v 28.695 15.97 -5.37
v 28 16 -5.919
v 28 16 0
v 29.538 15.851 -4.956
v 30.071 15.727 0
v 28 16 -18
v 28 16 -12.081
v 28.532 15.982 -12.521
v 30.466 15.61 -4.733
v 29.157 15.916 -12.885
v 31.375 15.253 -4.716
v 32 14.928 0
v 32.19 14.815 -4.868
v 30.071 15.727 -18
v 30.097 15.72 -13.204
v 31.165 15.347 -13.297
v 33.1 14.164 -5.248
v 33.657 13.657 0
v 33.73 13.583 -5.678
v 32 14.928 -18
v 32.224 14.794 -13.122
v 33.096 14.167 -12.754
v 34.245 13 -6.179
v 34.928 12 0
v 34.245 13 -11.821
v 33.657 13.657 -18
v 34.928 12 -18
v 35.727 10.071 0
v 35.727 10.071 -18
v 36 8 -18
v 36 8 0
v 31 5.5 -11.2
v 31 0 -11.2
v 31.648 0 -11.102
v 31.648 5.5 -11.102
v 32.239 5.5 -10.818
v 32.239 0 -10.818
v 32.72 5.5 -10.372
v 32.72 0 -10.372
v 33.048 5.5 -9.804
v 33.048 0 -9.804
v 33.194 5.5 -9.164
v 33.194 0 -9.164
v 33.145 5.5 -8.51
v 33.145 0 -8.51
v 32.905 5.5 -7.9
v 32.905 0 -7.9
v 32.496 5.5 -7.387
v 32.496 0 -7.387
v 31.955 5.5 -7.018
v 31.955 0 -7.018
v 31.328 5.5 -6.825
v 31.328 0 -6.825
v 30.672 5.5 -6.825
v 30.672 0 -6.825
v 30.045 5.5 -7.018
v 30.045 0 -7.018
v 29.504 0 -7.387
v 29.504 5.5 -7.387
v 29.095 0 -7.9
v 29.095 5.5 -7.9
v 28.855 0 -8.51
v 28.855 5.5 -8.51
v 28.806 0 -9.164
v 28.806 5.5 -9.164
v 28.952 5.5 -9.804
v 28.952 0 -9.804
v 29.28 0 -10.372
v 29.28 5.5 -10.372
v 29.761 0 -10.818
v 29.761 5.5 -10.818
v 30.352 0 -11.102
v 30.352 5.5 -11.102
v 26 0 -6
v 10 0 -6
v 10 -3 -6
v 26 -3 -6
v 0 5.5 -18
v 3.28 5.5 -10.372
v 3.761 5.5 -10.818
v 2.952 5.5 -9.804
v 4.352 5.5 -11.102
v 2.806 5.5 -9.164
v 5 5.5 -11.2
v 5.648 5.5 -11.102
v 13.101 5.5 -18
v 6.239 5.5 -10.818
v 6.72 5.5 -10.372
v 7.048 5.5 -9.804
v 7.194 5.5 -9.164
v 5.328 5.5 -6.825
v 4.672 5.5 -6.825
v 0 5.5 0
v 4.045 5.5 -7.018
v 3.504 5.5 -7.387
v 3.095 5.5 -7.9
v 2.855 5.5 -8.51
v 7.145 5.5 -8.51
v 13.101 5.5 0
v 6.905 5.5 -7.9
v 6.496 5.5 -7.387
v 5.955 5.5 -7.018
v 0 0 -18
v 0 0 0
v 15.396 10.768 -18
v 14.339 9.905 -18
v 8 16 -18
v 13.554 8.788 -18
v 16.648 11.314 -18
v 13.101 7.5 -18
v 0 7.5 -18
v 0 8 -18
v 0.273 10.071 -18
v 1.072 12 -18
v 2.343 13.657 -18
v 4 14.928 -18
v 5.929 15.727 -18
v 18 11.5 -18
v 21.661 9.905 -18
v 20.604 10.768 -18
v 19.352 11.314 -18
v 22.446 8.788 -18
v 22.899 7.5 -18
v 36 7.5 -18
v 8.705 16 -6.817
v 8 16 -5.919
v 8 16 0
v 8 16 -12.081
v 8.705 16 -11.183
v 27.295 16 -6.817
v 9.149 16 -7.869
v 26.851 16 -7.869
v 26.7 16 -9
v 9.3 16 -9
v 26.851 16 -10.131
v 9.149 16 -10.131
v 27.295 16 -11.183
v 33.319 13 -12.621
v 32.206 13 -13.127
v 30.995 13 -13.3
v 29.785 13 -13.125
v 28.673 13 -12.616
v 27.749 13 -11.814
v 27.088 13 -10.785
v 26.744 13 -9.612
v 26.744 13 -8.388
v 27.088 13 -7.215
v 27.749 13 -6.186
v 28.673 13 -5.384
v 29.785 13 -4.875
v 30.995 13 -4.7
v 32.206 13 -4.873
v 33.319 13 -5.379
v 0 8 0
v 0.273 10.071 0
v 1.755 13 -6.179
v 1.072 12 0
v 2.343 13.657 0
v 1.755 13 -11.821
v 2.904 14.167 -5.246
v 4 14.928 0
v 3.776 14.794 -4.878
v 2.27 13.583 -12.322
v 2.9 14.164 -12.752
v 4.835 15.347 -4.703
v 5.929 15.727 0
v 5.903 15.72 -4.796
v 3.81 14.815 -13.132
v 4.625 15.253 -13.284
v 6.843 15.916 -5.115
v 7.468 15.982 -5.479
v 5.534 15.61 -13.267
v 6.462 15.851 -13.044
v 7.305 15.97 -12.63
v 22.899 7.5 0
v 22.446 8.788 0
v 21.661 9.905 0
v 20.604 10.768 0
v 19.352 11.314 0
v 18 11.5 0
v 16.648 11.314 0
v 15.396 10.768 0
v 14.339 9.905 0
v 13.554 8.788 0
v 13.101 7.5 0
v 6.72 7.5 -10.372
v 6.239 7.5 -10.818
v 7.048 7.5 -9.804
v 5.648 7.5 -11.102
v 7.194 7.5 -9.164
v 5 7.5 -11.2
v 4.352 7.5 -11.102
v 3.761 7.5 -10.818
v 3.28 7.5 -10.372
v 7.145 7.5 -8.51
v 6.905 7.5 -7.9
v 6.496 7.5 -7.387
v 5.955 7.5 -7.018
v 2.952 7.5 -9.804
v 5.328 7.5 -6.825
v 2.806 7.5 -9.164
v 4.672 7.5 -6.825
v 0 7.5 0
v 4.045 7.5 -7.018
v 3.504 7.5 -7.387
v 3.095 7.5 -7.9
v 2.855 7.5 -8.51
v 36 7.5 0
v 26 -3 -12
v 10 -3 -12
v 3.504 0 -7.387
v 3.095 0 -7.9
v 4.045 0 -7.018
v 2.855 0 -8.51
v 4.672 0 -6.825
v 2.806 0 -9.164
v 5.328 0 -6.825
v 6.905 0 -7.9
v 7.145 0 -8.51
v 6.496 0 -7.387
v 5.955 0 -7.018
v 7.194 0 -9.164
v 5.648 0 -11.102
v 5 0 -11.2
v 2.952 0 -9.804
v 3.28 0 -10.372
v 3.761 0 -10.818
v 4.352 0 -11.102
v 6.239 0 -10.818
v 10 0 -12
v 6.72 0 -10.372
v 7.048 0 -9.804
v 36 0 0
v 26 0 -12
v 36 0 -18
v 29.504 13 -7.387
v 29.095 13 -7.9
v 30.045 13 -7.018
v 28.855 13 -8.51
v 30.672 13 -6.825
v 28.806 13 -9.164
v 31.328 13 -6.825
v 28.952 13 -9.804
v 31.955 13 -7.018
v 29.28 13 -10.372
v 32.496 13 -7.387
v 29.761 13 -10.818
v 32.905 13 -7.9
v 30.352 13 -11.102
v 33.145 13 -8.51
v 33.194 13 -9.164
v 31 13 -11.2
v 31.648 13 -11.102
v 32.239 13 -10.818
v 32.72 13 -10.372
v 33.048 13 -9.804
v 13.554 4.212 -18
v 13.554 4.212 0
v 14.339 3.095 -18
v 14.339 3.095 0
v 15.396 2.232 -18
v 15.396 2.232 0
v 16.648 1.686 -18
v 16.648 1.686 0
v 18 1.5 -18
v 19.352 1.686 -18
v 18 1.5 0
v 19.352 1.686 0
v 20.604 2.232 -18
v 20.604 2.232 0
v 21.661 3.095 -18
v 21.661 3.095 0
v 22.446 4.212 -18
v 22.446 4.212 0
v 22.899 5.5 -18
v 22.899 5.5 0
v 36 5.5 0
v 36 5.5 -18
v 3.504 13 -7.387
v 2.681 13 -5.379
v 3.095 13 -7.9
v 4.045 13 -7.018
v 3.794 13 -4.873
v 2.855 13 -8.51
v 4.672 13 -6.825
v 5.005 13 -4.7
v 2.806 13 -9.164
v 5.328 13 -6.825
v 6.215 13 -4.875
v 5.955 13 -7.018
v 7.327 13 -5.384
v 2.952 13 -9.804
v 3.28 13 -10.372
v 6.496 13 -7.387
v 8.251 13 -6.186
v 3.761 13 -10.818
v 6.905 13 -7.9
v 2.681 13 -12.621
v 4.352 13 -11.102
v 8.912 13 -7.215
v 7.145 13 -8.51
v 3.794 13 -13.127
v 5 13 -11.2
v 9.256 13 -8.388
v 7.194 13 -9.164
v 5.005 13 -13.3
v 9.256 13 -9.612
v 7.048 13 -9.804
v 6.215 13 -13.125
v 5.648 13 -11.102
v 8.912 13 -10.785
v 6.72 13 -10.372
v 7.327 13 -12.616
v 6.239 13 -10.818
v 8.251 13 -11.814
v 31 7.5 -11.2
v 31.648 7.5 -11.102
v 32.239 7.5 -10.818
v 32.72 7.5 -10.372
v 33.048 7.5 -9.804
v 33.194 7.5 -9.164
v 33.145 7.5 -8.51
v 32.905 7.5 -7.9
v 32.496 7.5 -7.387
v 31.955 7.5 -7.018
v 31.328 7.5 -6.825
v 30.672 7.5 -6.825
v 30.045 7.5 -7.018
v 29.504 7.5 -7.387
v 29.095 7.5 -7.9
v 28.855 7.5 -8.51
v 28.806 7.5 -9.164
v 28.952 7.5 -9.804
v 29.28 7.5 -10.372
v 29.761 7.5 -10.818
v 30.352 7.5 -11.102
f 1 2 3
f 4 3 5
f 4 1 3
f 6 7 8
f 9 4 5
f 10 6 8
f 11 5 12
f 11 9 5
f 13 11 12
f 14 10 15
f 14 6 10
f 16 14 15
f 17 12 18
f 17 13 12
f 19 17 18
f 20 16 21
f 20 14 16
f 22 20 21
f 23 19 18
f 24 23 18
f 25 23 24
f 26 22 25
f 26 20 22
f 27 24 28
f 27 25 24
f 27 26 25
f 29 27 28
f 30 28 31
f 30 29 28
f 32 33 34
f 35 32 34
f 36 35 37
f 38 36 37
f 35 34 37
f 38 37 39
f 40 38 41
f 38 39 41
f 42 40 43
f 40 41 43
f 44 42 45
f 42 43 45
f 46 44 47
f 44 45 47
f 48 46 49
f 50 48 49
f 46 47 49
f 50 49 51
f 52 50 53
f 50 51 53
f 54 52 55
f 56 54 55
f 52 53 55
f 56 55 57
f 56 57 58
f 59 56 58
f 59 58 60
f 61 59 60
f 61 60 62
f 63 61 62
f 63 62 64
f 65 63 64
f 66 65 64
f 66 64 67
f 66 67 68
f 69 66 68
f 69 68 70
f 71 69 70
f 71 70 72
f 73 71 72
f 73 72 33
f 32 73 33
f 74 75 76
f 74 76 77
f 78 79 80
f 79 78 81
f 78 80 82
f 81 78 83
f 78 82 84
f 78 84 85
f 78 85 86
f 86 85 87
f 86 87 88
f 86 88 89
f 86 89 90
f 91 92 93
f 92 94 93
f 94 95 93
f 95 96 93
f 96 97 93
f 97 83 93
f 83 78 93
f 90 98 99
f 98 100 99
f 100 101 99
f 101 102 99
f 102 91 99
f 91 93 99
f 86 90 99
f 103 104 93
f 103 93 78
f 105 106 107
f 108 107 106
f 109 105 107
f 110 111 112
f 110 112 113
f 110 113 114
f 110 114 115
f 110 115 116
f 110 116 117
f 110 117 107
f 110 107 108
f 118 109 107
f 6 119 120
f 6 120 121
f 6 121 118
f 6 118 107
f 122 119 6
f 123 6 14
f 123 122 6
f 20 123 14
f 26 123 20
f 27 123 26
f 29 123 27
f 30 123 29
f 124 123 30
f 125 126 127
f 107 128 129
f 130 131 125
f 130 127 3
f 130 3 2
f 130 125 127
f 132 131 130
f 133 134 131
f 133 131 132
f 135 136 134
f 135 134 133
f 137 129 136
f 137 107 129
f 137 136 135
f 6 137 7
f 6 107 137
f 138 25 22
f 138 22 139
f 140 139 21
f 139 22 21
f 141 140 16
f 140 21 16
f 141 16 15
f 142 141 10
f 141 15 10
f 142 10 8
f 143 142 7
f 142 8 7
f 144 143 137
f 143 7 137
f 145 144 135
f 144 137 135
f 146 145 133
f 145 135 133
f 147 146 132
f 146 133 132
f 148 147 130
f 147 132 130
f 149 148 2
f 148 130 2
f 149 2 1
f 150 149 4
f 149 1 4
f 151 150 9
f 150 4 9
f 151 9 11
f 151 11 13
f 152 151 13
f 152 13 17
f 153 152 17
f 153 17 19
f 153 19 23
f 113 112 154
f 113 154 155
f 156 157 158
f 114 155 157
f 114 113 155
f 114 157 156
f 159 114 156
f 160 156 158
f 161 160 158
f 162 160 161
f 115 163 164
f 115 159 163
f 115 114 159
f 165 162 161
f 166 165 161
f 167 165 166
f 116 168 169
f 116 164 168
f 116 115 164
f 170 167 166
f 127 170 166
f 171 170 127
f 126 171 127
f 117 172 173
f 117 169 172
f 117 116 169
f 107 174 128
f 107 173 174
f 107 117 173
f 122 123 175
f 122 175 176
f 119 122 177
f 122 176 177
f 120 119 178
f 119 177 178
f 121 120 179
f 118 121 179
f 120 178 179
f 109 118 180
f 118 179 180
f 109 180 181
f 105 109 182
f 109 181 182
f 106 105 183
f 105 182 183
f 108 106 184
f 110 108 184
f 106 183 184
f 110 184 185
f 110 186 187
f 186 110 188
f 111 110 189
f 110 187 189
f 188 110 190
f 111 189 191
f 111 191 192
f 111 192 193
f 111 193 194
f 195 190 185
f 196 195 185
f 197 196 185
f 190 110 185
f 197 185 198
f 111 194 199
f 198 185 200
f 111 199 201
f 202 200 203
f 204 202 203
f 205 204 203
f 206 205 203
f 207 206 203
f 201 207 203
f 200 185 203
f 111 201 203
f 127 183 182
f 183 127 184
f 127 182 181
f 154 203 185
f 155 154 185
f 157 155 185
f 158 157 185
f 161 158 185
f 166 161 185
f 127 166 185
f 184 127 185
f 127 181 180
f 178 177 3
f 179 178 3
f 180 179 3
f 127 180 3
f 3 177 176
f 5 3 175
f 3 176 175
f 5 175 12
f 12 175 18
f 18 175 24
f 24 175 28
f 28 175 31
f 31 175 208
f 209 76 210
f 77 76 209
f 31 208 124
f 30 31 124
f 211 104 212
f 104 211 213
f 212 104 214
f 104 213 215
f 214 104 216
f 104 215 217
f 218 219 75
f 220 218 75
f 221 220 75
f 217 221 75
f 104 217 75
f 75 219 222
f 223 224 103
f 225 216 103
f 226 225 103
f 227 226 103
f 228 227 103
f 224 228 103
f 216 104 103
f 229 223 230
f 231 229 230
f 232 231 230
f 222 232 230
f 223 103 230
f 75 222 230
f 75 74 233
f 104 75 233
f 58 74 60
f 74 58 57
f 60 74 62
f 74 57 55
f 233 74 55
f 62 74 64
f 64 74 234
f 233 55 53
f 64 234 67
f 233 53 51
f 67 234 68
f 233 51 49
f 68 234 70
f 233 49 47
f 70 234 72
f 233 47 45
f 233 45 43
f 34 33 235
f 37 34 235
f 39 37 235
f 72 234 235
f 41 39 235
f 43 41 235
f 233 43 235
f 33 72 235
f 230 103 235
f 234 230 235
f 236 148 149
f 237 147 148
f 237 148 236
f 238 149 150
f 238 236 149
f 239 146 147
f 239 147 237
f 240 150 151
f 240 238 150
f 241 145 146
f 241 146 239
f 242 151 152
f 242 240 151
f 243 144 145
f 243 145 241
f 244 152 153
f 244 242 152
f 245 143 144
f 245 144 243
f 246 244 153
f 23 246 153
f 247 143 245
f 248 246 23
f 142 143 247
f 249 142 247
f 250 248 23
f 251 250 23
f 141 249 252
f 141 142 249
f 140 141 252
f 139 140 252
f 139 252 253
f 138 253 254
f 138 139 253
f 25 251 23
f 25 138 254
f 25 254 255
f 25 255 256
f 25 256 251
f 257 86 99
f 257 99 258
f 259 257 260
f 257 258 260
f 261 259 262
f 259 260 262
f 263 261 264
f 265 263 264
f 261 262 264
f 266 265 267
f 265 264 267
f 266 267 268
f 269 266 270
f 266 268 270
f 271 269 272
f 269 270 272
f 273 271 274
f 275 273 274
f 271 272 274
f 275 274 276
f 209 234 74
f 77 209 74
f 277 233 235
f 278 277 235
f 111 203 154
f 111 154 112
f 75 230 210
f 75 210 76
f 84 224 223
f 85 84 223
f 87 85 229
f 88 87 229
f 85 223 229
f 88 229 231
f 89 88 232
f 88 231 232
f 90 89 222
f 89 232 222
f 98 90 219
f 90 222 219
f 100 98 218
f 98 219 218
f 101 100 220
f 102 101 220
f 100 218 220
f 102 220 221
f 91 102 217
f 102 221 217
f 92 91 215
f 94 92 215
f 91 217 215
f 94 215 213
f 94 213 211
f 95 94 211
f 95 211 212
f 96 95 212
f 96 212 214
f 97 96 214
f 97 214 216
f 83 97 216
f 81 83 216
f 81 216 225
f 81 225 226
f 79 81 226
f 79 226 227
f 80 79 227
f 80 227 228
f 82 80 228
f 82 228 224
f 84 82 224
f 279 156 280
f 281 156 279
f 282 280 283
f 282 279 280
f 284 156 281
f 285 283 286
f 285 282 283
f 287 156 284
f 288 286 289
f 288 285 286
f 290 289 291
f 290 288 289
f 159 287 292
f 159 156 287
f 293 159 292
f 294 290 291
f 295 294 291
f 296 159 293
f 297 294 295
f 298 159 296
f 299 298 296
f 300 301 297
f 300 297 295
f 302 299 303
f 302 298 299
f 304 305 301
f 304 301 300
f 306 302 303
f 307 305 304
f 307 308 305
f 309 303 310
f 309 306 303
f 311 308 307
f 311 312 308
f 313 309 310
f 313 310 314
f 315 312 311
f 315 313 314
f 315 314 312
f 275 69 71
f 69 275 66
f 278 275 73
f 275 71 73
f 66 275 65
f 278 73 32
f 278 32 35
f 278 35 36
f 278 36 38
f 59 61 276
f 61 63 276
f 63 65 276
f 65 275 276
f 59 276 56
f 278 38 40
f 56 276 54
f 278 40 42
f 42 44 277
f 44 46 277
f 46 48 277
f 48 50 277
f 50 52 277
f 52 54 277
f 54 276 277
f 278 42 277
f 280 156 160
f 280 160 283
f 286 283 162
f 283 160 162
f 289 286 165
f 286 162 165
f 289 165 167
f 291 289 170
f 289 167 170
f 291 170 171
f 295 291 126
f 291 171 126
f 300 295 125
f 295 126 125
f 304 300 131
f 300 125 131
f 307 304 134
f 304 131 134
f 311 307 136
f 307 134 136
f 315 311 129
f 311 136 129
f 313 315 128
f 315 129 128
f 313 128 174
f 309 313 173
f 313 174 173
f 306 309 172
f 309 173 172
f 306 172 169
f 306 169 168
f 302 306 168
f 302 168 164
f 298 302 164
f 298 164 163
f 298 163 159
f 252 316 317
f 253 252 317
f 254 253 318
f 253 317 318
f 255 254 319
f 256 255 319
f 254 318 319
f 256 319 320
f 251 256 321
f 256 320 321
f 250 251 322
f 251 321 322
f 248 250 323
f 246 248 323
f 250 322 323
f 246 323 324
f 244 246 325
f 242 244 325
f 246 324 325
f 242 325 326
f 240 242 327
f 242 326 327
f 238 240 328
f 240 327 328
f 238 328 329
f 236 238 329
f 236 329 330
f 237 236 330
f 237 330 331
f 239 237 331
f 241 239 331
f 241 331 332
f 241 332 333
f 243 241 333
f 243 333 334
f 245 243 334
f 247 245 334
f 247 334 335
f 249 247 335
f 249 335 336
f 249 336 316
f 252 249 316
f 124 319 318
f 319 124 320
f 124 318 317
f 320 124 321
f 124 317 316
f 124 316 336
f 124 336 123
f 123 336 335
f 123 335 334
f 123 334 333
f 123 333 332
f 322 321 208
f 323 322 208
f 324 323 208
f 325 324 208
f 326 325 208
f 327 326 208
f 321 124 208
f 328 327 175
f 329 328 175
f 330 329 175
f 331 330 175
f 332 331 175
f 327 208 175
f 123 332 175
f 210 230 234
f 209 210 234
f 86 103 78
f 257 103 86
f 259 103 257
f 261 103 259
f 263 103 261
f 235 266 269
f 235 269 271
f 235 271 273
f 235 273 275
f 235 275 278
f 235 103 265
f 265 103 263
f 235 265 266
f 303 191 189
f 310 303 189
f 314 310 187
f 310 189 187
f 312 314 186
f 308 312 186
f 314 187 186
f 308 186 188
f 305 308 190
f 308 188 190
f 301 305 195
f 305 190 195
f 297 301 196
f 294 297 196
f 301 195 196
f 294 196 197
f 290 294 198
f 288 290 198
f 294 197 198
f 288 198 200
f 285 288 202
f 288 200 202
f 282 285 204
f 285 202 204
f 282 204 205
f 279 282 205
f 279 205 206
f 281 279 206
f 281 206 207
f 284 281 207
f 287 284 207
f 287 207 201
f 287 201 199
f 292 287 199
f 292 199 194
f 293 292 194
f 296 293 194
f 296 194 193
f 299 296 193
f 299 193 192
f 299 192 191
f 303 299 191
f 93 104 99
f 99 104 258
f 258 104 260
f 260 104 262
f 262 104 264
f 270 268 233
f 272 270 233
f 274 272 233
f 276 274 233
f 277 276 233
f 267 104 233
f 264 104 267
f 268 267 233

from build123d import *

# Parameters (mm, degrees)
SKETCH_1_W          = 36
SKETCH_1_H          = 18
EXTRUDE_1_DEPTH     = 16
SKETCH_2_W          = 16
SKETCH_2_H          = 6
EXTRUDE_2_DEPTH     = 3
SKETCH_3_R          = 2.2
CUT_EXTRUDE_1_DEPTH = 30
CUT_EXTRUDE_2_DEPTH = 30
FILLET_START        = -18
FILLET_1_DEPTH      = 18
SKETCH_8_R          = 4.3
CUT_EXTRUDE_6_DEPTH = 3


with BuildPart() as part:
    # Эскиз1 → Бобышка-Вытянуть1 (new body)
    with BuildSketch(Plane(origin=(0, 0, 0), x_dir=(1, 0, 0), z_dir=(0, 1, 0))):
        with Locations((18, 9)):
            Rectangle(SKETCH_1_W, SKETCH_1_H)
    extrude(amount=EXTRUDE_1_DEPTH)

    # Эскиз2 → Бобышка-Вытянуть2 (add)
    with BuildSketch(Plane.XZ):
        with Locations((18, -9)):
            Rectangle(SKETCH_2_W, SKETCH_2_H)
    extrude(amount=EXTRUDE_2_DEPTH)

    # Эскиз3 → Вырез-Вытянуть1 (cut)
    with BuildSketch(Plane.XZ):
        with Locations(Location((5, -9, 0), (0, 0, 270))):
            Circle(SKETCH_3_R)
        with Locations(Location((31, -9, 0), (0, 0, 270))):
            Circle(SKETCH_3_R)
    extrude(amount=-CUT_EXTRUDE_1_DEPTH, mode=Mode.SUBTRACT)

    # Эскиз4 → Вырез-Вытянуть2 (cut)
    with BuildSketch(Plane.XY):
        with BuildLine():
            Line((13.101020514, 7.5), (22.898979486, 7.5))
            ThreePointArc((22.898979486, 7.5), (18, 11.5), (13.101020514, 7.5))
        make_face()
        with BuildLine():
            ThreePointArc((23, 6.5), (22.974680765, 7.00254481), (22.898979486, 7.5))
            Line((22.898979486, 7.5), (13.101020514, 7.5))
            ThreePointArc((13.101020514, 7.5), (13, 6.5), (13.101020514, 5.5))
            Line((13.101020514, 5.5), (22.898979486, 5.5))
            ThreePointArc((22.898979486, 5.5), (22.974680765, 5.99745519), (23, 6.5))
        make_face()
        with BuildLine():
            ThreePointArc((13.101020514, 5.5), (18, 1.5), (22.898979486, 5.5))
            Line((22.898979486, 5.5), (13.101020514, 5.5))
        make_face()
        with BuildLine():
            ThreePointArc((13.101020514, 5.5), (13, 6.5), (13.101020514, 7.5))
            Line((13.101020514, 7.5), (0, 7.5))
            Line((0, 7.5), (0, 5.5))
            Line((0, 5.5), (13.101020514, 5.5))
        make_face()
        with BuildLine():
            Line((36, 5.5), (36, 7.5))
            Line((36, 7.5), (22.898979486, 7.5))
            ThreePointArc((22.898979486, 7.5), (22.974680765, 7.00254481), (23, 6.5))
            ThreePointArc((23, 6.5), (22.974680765, 5.99745519), (22.898979486, 5.5))
            Line((22.898979486, 5.5), (36, 5.5))
        make_face()
    extrude(amount=-CUT_EXTRUDE_2_DEPTH, mode=Mode.SUBTRACT)


with BuildPart() as cut_extrude_2_piece_1:
    # of the separate pieces the step leaves, piece 1, a body of its own (cut_extrude_2_pieces)
    add(part.part.solids().sort_by_distance((13.101020514, 7.5, 0))[0])

    # Скругление1: read off the stored shape, not the designer's step
    # Скругление1 outline → Скругление1 (cut)
    with BuildSketch(Plane.XY.offset(FILLET_START)):
        with BuildLine():
            ThreePointArc((0, 8), (2.343145751, 13.656854249), (8, 16))
            Line((8, 16), (0, 16))
            Line((0, 16), (0, 8))
        make_face()
        with BuildLine():
            Line((36, 16), (28, 16))
            ThreePointArc((28, 16), (33.656854249, 13.656854249), (36, 8))
            Line((36, 8), (36, 16))
        make_face()
    extrude(amount=FILLET_1_DEPTH, mode=Mode.SUBTRACT)

    # Эскиз8 → Вырез-Вытянуть6 (cut)
    with BuildSketch(Plane(origin=(0, 16, 0), x_dir=(1, 0, 0), z_dir=(0, 1, 0))):
        with Locations((5, 9)):
            Circle(SKETCH_8_R)
        with Locations((31, 9)):
            Circle(SKETCH_8_R)
    extrude(amount=-CUT_EXTRUDE_6_DEPTH, mode=Mode.SUBTRACT)


with BuildPart() as cut_extrude_2_piece_2:
    # of the separate pieces the step leaves, piece 2, a body of its own (cut_extrude_2_pieces)
    add(part.part.solids().sort_by_distance((0, 0, 0))[0])


solid = Compound([cut_extrude_2_piece_1.part, cut_extrude_2_piece_2.part])
